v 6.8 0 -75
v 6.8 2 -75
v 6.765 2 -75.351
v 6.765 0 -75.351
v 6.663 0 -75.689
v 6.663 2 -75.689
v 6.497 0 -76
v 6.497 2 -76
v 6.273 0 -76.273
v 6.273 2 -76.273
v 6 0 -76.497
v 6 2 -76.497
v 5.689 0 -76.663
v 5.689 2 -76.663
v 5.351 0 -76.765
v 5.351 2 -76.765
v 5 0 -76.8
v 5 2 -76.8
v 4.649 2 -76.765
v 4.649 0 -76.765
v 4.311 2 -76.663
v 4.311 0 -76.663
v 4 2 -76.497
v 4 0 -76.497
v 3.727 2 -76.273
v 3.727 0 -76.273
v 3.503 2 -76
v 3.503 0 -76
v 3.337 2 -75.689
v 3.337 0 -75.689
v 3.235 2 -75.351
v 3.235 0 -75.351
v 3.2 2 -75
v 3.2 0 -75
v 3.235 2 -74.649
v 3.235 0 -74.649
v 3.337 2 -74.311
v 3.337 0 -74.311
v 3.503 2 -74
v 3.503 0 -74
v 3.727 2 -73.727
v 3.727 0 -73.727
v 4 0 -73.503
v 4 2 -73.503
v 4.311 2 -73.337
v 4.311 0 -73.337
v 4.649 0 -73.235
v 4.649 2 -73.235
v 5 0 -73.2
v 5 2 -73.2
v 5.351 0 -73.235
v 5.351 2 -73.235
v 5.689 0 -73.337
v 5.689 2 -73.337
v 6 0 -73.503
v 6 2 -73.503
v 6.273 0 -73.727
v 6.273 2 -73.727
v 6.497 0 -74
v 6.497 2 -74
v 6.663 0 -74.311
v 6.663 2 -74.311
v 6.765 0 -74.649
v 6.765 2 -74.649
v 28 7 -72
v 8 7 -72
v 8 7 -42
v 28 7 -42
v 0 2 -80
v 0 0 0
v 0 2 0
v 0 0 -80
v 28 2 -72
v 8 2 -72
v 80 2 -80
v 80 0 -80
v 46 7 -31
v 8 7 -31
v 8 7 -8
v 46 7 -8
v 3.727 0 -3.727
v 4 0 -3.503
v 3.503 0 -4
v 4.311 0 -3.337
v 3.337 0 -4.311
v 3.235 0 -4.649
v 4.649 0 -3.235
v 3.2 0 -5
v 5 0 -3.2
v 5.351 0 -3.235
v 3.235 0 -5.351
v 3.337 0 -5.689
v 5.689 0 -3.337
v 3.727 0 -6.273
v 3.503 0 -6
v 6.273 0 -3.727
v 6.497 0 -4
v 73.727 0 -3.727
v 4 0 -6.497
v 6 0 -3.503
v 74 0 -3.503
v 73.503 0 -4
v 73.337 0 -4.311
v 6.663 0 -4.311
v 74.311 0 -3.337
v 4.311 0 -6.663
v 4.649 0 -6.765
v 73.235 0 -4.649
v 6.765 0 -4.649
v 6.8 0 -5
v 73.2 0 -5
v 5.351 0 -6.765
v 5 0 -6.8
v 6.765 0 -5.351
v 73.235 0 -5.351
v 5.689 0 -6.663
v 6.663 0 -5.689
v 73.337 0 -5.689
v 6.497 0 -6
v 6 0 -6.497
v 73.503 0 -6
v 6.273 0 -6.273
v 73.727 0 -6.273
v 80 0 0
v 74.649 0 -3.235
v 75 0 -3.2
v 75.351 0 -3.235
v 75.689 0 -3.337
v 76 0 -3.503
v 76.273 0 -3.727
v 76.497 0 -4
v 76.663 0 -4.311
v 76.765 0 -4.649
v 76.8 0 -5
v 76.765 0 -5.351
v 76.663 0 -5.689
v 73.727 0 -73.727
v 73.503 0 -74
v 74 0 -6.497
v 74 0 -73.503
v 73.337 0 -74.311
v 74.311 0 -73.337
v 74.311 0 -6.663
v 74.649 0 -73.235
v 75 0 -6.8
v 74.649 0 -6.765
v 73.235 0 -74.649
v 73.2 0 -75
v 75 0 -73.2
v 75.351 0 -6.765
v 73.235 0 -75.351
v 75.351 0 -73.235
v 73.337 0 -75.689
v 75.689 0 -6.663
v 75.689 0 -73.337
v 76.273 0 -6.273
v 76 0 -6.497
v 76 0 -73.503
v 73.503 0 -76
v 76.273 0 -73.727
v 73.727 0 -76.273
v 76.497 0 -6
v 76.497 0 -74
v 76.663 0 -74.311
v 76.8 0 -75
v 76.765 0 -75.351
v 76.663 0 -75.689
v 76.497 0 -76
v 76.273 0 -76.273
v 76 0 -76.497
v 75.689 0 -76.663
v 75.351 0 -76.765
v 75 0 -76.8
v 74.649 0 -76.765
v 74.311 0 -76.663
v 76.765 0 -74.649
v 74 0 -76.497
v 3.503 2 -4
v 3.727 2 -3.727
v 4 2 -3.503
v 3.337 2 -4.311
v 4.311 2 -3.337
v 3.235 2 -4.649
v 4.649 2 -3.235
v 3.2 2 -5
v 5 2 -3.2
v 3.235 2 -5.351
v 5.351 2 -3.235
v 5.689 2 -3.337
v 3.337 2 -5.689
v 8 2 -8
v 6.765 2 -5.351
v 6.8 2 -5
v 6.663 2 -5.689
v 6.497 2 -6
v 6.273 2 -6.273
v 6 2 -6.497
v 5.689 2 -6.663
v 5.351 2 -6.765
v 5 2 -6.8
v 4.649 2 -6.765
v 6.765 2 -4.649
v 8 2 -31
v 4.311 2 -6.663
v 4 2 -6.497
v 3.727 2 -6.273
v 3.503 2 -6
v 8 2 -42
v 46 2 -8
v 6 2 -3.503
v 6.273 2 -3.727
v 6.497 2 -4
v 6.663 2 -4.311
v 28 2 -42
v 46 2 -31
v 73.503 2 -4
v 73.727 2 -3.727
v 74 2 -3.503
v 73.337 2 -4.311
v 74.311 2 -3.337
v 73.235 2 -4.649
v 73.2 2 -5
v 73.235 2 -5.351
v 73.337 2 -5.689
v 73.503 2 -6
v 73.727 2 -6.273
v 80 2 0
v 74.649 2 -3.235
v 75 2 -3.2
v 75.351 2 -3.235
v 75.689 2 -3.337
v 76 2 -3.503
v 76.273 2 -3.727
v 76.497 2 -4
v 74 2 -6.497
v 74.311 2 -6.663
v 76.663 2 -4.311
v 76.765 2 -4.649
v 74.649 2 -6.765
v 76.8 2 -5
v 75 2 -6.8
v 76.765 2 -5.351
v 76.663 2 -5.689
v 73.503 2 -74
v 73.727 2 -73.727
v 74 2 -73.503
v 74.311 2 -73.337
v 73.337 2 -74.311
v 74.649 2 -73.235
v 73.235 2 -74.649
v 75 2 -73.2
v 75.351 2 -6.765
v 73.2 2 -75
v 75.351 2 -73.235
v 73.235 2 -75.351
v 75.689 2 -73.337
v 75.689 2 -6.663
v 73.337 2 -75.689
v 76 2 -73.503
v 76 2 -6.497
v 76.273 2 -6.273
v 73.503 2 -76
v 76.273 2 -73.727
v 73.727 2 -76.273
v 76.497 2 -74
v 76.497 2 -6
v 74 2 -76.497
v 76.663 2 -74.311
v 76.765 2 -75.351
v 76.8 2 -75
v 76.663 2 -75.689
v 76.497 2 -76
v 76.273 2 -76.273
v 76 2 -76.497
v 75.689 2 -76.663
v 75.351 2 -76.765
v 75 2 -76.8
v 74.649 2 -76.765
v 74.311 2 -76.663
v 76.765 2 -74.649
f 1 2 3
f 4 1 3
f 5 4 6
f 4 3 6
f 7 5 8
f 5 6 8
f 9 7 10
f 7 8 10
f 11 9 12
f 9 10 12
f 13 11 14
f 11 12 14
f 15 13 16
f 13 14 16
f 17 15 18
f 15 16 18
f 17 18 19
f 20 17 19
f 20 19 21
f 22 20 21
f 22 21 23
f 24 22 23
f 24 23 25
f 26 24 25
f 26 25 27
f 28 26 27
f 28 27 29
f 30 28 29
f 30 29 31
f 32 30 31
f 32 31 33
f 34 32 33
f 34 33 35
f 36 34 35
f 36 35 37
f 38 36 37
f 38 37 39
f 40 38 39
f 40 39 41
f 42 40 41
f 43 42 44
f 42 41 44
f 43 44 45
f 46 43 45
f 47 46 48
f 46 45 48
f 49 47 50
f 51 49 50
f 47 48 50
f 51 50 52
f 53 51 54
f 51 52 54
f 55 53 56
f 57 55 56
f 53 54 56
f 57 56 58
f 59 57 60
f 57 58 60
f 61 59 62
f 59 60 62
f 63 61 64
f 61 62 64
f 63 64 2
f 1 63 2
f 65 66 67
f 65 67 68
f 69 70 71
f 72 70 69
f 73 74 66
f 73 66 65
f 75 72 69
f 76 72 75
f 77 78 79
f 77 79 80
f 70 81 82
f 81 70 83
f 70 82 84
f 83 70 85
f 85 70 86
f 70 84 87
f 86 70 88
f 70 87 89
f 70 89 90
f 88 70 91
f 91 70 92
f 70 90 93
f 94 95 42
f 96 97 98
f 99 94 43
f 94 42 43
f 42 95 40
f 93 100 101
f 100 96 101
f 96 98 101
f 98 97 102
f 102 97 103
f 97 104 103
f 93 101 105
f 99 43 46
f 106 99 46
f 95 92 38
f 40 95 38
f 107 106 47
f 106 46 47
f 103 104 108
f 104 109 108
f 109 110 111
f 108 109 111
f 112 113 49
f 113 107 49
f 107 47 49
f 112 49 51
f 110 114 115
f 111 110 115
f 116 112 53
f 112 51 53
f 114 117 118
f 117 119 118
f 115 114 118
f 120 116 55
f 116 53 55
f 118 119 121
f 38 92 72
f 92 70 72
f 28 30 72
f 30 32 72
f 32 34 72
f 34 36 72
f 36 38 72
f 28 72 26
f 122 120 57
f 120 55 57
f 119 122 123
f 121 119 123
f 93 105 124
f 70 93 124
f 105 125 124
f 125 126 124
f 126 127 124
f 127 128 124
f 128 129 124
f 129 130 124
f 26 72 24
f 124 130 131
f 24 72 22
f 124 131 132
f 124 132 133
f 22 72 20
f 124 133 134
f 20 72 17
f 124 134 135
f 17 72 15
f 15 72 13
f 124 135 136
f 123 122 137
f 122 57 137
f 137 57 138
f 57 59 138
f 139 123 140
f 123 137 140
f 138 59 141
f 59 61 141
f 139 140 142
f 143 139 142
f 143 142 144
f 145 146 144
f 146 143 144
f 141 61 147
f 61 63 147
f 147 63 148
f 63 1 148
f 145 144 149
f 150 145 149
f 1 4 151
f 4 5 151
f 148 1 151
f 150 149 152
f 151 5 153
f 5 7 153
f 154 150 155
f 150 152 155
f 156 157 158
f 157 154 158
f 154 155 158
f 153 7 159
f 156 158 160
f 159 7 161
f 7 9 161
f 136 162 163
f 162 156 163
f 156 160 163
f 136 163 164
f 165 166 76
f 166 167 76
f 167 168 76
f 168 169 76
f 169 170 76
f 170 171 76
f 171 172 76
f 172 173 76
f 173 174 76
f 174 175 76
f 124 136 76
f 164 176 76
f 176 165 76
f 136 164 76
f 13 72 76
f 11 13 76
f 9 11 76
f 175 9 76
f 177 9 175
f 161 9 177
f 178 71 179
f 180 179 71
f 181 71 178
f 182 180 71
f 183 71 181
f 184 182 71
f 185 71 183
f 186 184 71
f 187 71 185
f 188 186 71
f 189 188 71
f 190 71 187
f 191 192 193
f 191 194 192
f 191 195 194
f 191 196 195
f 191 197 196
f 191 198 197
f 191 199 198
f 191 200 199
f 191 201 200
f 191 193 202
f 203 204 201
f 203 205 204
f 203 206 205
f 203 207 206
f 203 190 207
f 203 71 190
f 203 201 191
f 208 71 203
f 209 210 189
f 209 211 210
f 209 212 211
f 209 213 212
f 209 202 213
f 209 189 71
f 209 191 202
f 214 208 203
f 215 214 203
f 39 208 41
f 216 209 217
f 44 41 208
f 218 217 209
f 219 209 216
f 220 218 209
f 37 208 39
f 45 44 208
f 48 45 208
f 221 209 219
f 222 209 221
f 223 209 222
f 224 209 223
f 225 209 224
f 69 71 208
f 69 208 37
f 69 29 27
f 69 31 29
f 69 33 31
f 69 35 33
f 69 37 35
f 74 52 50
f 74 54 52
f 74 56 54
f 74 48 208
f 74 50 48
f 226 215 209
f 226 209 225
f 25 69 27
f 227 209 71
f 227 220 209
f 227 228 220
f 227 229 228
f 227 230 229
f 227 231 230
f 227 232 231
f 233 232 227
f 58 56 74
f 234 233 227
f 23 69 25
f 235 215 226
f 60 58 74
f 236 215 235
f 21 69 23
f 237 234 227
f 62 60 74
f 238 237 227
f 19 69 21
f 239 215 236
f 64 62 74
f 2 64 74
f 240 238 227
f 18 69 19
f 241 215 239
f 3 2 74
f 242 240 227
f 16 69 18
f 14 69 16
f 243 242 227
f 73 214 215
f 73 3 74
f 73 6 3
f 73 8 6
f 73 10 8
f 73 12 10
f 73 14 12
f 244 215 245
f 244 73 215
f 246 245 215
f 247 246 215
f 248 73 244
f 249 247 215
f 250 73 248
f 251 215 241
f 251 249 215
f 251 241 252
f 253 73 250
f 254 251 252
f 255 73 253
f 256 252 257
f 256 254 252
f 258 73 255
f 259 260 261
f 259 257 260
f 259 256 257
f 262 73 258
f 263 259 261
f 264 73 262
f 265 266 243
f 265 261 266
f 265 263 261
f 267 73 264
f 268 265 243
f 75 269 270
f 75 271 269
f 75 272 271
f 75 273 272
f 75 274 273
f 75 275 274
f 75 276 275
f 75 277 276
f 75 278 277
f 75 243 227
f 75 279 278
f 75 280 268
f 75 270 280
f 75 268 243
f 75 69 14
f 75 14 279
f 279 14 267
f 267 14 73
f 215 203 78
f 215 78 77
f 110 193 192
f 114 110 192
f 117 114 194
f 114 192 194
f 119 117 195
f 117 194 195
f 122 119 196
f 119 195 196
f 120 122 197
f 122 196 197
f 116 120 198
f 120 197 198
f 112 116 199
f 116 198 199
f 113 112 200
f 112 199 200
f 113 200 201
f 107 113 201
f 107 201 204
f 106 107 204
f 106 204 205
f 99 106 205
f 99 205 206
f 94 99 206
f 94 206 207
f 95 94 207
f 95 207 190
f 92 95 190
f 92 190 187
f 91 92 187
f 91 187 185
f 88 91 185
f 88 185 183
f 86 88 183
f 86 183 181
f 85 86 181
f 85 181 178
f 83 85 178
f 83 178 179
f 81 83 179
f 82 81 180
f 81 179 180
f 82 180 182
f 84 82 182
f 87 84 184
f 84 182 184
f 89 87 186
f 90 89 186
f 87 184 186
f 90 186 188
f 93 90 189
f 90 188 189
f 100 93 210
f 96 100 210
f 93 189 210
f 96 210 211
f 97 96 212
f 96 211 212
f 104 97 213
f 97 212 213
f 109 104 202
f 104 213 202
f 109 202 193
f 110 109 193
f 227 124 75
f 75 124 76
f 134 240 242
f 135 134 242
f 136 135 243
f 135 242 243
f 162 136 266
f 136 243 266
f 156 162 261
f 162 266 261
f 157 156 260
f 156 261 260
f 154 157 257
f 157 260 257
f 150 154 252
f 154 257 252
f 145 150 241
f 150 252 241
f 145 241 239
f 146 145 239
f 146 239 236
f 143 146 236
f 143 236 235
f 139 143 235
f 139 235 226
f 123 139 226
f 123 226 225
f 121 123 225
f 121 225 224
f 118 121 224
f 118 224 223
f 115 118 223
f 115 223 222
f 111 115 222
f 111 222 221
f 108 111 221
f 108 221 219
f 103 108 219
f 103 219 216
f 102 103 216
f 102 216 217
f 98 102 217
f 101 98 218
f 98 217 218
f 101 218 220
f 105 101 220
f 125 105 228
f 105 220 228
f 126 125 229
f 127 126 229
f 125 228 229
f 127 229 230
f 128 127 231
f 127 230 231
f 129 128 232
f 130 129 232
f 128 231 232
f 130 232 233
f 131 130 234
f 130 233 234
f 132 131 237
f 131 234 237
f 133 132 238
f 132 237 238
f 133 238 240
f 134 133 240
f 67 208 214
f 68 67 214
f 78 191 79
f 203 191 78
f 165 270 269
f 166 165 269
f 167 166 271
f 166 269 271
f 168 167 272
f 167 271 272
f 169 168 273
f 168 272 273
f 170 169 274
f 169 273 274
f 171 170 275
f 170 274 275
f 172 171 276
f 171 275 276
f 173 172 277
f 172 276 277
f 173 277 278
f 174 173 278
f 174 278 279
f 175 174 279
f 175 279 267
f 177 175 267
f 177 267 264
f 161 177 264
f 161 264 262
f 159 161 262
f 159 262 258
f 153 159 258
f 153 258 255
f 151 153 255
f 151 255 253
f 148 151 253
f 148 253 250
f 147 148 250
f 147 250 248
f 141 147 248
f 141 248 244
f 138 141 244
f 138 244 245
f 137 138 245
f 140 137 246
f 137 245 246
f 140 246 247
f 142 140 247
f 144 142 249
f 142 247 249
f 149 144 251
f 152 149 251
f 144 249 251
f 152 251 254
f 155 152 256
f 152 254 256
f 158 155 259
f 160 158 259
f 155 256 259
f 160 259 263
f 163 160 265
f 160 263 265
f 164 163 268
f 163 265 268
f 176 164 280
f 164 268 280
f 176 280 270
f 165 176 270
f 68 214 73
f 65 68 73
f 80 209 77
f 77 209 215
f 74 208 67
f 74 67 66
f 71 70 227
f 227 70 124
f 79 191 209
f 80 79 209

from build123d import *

# Parameters (mm, degrees)
SKETCH1_W              = 80
SKETCH1_H              = 80
PCB_DEPTH              = 2
SKETCH2_R              = 1.8
ATTACHMENT_HOLES_DEPTH = 3
LPATTERN1_COUNT        = 2
LPATTERN1_PITCH        = 70
LPATTERN1_COUNT_DIR2   = 2
LPATTERN1_PITCH_DIR2   = 70
SKETCH3_W              = 20
SKETCH3_H              = 30
GPS_DEPTH              = 5
SKETCH4_W              = 38
SKETCH4_H              = 23
IMU_DEPTH              = 5


with BuildPart() as part:
    # Sketch1 → PCB (new body)
    with BuildSketch(Plane(origin=(0, 0, 0), x_dir=(1, 0, 0), z_dir=(0, 1, 0))):
        with Locations((40, 40)):
            Rectangle(SKETCH1_W, SKETCH1_H)
    extrude(amount=PCB_DEPTH)

    # Sketch2 → Attachment Holes (cut, through all)
    with BuildSketch(Plane(origin=(0, 2, 0), x_dir=(1, 0, 0), z_dir=(0, 1, 0))):
        with Locations((5, 75)):
            Circle(SKETCH2_R)
    attachment_holes = extrude(amount=-ATTACHMENT_HOLES_DEPTH, mode=Mode.SUBTRACT)

    # LPattern1: Attachment Holes 2 × 2
    with Locations(*[(i * LPATTERN1_PITCH, 0, j * LPATTERN1_PITCH_DIR2) for i in range(LPATTERN1_COUNT) for j in range(LPATTERN1_COUNT_DIR2) if (i, j) != (0, 0)]):
        add(attachment_holes, mode=Mode.SUBTRACT)

    # Sketch3 → GPS (add)
    with BuildSketch(Plane(origin=(0, 2, 0), x_dir=(1, 0, 0), z_dir=(0, 1, 0))):
        with Locations((18, 57)):
            Rectangle(SKETCH3_W, SKETCH3_H)
    extrude(amount=GPS_DEPTH)

    # Sketch4 → IMU (add)
    with BuildSketch(Plane(origin=(0, 2, 0), x_dir=(1, 0, 0), z_dir=(0, 1, 0))):
        with Locations((27, 19.5)):
            Rectangle(SKETCH4_W, SKETCH4_H)
    extrude(amount=IMU_DEPTH)


solid = part.part
